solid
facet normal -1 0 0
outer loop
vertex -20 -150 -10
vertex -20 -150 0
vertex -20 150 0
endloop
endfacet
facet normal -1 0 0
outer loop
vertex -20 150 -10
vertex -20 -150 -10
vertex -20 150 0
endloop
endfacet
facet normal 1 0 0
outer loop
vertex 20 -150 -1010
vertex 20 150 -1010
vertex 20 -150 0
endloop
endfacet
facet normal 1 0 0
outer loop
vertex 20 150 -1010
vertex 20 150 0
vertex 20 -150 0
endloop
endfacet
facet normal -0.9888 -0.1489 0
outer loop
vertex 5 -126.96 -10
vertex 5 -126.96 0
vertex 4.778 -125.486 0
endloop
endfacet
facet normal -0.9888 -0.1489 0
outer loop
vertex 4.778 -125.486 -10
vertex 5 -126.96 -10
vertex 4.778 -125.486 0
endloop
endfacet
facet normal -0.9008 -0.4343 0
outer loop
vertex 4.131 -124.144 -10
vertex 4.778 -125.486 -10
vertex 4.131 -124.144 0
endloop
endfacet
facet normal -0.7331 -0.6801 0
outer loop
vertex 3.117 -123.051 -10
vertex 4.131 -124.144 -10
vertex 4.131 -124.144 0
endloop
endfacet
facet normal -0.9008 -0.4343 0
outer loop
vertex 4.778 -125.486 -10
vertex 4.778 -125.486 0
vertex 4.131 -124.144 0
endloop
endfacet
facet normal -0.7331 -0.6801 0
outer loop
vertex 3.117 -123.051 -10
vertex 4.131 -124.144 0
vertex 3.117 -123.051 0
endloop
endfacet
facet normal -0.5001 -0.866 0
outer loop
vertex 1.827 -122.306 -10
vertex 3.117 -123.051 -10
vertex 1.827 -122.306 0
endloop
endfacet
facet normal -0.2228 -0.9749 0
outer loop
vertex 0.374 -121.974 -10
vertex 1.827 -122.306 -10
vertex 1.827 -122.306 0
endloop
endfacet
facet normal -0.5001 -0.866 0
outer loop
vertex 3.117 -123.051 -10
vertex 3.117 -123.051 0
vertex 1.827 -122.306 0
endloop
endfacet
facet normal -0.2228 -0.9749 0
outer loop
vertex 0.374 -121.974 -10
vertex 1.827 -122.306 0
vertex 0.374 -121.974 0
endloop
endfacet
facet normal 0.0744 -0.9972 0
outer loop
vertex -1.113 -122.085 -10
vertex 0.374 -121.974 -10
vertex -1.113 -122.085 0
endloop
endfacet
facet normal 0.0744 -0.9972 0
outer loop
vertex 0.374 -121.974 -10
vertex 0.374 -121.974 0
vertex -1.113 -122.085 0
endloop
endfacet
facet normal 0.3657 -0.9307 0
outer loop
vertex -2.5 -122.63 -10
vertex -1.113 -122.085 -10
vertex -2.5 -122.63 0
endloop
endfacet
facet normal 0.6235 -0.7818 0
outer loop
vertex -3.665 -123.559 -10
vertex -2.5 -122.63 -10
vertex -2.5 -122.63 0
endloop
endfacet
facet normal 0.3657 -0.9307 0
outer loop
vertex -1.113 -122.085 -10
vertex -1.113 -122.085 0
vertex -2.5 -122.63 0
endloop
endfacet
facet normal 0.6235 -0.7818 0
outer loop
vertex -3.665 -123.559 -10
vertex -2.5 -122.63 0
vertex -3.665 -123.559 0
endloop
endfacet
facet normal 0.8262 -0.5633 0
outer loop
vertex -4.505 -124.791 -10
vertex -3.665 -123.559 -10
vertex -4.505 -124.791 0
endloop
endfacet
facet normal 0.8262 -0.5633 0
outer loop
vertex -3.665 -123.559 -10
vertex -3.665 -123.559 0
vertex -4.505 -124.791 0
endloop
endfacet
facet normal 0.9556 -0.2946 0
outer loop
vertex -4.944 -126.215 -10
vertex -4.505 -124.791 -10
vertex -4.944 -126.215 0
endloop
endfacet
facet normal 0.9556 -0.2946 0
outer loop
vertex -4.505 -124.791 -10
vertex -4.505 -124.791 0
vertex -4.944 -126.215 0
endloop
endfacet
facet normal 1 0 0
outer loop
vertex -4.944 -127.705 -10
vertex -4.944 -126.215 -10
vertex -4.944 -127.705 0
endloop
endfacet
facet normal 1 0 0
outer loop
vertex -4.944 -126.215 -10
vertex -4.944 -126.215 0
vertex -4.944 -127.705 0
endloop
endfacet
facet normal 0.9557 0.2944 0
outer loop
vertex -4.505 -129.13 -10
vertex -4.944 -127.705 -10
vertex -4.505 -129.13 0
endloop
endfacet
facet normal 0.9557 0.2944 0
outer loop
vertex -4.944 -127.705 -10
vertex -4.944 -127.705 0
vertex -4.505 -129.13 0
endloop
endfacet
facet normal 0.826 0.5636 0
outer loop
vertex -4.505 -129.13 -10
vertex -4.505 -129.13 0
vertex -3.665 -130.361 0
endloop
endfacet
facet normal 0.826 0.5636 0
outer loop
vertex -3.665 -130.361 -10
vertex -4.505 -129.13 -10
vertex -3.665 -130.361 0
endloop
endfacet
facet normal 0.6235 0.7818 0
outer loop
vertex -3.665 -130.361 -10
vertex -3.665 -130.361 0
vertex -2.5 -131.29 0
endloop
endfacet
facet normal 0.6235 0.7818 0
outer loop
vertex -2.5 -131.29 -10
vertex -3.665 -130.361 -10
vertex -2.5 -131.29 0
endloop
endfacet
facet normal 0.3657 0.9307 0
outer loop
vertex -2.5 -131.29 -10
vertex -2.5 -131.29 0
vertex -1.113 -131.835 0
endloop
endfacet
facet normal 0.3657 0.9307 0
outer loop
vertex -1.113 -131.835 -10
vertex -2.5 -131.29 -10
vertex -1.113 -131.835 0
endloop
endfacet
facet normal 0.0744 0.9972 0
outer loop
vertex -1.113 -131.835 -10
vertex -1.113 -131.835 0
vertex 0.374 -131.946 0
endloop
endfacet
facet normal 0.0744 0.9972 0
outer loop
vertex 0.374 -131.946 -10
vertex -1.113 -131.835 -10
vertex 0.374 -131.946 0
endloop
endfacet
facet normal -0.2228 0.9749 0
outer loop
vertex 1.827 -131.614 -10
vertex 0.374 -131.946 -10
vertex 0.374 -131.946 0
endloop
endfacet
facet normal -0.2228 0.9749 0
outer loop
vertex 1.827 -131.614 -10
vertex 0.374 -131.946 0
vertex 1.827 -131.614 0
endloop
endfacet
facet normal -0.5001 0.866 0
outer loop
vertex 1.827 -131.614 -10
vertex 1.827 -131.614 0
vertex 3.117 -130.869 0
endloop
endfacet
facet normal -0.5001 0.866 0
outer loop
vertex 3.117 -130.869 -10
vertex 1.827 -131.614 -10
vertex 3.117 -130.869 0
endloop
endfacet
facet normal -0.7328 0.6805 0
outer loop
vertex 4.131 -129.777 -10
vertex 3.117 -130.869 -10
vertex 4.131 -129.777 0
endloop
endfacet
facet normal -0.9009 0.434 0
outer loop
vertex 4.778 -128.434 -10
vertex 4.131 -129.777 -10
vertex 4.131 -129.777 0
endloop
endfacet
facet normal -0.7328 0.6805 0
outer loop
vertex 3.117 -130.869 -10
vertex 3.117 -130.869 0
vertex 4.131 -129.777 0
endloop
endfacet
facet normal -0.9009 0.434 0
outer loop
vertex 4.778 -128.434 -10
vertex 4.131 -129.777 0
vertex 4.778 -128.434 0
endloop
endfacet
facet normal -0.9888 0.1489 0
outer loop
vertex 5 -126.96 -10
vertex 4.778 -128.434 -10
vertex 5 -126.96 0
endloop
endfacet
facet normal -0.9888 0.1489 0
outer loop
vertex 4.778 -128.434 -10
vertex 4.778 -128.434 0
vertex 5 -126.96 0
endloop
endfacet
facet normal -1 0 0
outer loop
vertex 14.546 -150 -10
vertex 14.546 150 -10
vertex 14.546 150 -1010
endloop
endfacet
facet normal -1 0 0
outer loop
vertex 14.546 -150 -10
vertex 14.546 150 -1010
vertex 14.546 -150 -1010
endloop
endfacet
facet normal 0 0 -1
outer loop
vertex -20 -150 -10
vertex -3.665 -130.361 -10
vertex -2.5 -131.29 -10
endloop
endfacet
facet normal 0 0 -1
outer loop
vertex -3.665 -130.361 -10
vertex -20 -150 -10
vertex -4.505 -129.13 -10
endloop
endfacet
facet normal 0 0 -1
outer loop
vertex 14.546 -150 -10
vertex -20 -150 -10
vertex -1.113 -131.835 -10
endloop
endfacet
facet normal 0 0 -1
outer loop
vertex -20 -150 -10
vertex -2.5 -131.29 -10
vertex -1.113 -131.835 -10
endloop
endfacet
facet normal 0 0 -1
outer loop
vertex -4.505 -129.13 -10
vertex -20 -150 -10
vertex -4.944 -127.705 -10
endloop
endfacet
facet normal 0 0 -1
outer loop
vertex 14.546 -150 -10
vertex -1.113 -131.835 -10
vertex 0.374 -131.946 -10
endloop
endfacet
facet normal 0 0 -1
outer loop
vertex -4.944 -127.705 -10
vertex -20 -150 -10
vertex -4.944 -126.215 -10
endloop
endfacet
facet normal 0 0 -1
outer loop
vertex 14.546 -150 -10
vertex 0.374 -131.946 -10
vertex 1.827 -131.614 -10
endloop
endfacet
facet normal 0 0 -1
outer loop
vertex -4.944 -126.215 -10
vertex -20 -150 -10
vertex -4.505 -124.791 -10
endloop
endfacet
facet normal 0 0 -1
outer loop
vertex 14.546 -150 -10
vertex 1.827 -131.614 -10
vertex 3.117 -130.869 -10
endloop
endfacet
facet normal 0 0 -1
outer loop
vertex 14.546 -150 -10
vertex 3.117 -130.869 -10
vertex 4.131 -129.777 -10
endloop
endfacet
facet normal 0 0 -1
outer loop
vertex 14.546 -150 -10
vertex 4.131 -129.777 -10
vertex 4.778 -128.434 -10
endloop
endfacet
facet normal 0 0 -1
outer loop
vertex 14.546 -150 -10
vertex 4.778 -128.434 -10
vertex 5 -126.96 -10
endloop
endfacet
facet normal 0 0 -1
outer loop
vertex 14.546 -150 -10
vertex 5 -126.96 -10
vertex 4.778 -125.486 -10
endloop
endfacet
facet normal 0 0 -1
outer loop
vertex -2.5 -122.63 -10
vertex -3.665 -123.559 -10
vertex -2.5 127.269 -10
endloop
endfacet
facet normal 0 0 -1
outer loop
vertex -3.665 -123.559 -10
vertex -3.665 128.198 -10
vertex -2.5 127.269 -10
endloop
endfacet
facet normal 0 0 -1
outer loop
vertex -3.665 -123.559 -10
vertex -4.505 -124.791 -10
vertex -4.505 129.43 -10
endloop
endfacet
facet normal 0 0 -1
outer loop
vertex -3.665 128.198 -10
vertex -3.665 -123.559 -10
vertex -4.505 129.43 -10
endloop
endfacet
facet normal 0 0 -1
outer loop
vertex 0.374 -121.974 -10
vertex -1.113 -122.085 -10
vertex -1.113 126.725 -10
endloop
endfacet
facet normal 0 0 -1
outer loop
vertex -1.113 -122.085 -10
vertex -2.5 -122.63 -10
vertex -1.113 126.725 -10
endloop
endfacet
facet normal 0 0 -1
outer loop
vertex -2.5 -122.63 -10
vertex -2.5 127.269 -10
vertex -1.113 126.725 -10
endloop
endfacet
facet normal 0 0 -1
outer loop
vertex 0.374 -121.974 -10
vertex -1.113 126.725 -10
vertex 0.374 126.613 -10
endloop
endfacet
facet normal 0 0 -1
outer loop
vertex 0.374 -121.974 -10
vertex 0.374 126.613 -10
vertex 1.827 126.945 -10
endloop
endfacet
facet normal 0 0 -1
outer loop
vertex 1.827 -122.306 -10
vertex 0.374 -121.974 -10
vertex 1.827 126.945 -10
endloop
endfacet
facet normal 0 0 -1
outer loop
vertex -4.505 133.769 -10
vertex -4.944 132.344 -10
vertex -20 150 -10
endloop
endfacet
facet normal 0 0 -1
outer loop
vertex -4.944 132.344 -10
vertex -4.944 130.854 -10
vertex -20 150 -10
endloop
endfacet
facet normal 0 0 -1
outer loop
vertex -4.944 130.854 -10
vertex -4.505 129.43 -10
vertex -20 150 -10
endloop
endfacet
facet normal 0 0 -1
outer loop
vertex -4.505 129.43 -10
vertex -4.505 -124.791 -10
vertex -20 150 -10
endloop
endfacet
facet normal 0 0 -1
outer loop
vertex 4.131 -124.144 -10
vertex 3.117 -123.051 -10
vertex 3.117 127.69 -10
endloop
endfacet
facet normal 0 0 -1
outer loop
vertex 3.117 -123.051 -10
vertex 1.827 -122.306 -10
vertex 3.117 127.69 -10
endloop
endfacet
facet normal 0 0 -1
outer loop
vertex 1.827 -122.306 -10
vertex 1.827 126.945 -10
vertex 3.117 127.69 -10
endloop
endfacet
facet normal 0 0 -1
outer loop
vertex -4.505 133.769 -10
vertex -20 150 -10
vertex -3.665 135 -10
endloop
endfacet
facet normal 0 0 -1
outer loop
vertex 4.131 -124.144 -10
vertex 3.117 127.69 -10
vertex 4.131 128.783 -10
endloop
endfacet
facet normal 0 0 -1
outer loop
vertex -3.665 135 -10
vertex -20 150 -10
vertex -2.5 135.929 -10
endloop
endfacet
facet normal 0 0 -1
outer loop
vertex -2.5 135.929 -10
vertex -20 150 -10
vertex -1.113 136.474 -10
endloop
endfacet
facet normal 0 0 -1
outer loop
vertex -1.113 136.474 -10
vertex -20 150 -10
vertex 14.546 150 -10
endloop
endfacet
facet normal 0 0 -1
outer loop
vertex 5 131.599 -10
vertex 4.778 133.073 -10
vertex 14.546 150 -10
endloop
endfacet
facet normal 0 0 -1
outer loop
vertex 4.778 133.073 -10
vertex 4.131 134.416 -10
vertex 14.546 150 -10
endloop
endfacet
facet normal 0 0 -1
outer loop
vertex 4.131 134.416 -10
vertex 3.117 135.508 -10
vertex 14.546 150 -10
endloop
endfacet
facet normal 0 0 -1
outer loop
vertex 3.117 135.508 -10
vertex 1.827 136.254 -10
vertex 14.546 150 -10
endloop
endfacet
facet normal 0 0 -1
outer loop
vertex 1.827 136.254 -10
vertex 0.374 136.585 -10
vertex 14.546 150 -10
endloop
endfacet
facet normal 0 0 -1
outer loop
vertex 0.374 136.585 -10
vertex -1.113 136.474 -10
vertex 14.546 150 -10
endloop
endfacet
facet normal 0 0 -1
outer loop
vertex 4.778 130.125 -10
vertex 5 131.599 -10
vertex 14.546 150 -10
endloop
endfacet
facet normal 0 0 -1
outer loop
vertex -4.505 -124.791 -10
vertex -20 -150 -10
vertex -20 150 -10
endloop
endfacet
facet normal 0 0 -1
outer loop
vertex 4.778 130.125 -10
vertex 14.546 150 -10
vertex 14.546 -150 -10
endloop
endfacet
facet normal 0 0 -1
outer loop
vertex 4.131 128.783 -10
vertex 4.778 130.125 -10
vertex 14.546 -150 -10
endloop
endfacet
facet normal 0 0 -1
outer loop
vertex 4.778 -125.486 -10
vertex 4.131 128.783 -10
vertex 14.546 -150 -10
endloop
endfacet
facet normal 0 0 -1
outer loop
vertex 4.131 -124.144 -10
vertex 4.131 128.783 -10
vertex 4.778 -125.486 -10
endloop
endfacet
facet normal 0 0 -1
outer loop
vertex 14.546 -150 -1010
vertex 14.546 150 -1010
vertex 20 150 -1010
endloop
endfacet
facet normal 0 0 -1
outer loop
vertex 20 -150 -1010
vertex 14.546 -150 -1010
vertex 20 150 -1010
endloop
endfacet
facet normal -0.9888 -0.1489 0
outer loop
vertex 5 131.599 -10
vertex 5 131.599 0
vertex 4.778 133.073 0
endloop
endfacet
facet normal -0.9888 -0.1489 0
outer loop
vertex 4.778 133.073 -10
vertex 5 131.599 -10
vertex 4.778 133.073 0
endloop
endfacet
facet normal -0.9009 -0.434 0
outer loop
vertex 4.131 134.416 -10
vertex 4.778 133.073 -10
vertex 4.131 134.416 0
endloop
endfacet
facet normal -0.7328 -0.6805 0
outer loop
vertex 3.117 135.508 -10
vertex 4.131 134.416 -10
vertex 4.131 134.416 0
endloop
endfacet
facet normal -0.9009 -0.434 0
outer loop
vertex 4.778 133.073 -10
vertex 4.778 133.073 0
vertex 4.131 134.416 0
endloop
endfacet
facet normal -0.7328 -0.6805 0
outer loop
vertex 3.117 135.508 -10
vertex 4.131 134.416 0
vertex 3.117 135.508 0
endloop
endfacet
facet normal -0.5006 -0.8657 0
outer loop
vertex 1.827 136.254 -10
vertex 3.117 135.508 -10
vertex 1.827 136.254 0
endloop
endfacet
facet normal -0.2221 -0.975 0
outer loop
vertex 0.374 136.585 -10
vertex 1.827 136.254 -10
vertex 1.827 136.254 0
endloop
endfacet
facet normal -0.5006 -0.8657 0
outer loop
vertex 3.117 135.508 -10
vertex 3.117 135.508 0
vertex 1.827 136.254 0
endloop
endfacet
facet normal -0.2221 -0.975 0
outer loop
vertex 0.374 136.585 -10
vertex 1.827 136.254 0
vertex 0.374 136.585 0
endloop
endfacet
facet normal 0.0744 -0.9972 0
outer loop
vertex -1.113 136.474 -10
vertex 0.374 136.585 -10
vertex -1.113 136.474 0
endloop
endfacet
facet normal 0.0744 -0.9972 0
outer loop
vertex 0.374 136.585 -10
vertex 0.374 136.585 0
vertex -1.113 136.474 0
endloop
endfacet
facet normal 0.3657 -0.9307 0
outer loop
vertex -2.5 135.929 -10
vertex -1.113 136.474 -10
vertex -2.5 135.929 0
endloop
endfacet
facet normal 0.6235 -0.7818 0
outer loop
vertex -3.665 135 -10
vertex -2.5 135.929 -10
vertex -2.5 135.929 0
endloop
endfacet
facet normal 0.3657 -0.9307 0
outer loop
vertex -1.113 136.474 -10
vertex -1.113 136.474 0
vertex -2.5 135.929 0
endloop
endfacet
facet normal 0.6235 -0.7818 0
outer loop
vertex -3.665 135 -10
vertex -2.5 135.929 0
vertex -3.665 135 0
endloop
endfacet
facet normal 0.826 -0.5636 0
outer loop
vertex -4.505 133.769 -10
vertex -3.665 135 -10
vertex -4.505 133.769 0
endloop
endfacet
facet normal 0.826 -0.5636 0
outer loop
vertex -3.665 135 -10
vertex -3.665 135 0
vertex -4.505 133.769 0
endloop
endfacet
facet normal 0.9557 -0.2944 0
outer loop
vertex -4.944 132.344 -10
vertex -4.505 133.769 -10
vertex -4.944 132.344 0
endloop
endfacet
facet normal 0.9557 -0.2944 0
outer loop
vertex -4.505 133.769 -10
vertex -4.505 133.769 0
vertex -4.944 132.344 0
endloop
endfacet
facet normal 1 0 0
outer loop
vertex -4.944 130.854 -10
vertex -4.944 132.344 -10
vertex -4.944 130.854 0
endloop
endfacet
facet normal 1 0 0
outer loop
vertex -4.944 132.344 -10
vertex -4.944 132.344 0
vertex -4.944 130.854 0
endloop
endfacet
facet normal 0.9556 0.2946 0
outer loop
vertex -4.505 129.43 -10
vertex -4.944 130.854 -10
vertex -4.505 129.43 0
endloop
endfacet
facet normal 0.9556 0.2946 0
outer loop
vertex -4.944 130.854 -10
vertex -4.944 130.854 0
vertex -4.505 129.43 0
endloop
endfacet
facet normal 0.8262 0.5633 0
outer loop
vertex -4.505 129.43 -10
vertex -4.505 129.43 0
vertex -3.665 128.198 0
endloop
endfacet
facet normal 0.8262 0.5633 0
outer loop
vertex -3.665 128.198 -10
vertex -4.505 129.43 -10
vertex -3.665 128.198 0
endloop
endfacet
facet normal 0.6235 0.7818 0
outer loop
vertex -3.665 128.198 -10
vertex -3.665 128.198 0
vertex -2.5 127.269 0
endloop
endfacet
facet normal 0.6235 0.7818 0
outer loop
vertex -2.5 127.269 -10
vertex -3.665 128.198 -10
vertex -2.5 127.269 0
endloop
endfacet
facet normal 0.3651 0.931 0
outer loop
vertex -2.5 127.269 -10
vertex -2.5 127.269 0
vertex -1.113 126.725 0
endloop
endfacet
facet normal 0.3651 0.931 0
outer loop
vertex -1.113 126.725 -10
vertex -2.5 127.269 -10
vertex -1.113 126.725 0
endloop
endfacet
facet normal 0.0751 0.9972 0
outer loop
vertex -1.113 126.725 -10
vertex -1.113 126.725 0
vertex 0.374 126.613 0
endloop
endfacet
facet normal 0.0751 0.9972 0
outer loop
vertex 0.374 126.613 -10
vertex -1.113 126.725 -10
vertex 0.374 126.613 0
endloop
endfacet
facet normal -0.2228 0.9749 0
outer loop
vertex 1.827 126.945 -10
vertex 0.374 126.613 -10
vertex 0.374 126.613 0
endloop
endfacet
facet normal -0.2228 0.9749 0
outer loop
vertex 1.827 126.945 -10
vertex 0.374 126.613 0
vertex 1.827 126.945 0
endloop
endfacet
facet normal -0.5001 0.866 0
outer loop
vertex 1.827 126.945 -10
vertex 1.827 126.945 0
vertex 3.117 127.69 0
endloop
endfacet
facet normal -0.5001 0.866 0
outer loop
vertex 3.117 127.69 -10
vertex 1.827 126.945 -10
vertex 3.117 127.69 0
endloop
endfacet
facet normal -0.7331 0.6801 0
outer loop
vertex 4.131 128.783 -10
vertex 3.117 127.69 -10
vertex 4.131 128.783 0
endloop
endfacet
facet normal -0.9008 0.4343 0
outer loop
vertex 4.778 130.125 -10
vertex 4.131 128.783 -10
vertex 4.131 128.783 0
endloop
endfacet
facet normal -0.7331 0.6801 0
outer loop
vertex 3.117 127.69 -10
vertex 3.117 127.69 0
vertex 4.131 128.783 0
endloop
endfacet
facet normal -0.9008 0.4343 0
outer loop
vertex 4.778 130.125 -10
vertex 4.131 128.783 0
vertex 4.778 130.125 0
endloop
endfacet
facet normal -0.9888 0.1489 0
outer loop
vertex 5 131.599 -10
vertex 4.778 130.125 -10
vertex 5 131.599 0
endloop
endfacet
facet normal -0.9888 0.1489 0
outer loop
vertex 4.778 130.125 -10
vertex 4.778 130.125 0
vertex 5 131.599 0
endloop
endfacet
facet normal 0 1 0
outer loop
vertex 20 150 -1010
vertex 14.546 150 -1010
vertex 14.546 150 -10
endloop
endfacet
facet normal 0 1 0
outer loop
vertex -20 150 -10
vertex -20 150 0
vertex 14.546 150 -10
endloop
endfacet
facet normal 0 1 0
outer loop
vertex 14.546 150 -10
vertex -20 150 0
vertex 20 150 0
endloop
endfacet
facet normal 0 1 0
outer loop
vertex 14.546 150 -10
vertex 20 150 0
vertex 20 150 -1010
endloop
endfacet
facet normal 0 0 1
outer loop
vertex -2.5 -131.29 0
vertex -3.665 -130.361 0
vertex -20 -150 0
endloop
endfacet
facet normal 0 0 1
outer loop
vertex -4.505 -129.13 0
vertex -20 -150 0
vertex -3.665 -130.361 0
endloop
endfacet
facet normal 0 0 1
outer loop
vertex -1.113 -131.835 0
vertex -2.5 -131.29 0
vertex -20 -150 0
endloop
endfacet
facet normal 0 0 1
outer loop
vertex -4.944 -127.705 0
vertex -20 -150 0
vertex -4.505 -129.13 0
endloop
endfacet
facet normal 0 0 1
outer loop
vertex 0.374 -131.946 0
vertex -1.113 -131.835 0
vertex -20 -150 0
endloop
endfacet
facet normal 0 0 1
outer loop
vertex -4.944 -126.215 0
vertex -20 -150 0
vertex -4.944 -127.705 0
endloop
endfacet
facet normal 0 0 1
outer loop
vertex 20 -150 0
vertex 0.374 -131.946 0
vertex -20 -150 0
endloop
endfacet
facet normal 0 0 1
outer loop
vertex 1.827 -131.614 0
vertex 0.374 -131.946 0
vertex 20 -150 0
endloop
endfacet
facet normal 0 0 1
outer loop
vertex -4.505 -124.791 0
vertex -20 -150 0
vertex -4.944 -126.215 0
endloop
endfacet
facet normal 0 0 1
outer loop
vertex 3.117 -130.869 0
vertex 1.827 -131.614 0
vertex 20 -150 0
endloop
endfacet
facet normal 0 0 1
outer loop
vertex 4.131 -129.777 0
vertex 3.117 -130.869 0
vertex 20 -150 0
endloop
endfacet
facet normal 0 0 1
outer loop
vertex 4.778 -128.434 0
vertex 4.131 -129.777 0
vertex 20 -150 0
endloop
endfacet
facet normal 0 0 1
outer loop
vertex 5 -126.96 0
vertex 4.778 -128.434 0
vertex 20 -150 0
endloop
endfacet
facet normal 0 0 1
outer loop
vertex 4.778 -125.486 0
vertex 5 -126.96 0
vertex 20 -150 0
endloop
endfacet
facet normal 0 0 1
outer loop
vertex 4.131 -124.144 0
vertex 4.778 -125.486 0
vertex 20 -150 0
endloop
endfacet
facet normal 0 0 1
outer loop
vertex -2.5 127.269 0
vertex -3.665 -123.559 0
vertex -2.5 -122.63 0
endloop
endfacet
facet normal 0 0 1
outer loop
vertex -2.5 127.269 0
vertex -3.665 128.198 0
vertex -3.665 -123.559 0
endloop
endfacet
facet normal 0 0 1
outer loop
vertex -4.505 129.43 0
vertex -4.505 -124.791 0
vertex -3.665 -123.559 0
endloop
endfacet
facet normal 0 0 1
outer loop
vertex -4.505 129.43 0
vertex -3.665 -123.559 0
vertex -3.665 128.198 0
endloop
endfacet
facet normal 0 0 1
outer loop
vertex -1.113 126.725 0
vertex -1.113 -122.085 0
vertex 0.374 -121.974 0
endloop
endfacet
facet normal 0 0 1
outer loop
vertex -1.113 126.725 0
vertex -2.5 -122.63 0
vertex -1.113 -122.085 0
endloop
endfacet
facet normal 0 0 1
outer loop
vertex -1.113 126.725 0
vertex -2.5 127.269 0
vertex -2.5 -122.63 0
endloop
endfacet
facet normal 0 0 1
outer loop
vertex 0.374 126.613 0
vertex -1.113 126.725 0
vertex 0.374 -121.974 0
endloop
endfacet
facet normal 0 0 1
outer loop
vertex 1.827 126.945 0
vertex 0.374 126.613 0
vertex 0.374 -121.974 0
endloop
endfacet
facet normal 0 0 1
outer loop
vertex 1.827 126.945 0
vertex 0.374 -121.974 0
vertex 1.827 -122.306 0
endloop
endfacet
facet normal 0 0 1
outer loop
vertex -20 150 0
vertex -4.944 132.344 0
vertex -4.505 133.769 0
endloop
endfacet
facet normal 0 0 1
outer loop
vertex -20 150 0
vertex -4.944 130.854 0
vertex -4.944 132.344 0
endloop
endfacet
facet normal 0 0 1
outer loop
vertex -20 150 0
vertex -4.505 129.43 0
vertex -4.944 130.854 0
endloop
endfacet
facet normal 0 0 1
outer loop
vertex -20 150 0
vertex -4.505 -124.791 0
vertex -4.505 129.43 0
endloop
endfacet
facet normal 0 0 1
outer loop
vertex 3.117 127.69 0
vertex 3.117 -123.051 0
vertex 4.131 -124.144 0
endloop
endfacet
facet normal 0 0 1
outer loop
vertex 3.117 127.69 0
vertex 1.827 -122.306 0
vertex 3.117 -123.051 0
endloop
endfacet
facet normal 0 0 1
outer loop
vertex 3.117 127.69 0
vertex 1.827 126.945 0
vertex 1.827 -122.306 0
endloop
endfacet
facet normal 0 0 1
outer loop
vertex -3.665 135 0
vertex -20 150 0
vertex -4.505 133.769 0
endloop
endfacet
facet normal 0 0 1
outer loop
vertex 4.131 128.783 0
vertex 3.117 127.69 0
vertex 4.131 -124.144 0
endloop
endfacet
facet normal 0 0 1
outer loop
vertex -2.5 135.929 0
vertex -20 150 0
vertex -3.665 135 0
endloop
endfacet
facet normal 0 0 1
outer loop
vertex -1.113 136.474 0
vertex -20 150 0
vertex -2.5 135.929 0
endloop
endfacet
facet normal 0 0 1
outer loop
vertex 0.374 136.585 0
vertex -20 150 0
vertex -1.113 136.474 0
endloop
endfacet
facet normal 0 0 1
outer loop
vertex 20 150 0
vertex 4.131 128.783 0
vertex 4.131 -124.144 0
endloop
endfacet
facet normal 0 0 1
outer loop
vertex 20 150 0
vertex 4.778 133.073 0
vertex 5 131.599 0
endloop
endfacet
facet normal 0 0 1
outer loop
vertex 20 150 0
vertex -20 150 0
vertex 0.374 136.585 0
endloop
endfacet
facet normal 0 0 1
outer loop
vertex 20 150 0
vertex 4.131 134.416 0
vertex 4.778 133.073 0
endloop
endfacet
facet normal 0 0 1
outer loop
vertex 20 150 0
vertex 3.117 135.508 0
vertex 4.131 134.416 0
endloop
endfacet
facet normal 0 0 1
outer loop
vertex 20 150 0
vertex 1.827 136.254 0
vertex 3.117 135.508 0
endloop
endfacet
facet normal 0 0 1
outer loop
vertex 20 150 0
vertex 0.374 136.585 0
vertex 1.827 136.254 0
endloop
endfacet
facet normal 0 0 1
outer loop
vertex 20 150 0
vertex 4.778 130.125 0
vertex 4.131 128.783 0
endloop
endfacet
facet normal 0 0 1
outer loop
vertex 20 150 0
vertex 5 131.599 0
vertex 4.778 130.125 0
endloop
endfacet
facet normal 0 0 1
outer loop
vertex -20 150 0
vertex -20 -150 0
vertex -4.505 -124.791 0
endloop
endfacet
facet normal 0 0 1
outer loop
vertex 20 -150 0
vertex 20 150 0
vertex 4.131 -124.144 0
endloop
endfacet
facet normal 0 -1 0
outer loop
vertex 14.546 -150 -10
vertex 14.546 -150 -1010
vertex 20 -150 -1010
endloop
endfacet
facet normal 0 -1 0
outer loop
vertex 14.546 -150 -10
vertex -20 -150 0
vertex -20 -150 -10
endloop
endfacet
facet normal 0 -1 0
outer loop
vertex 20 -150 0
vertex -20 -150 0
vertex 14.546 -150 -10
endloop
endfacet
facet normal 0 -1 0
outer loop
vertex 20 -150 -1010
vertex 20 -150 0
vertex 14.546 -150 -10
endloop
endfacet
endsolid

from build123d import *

# Parameters (mm, degrees)
F0_W     = 40
F0_H     = 300
F0_R     = 5
F1_DEPTH = 10
F2_W     = 5.453752
F2_H     = 300
F3_DEPTH = 1000


with BuildPart() as f1:
    # F0 (on Top) → F1 (new body)
    with BuildSketch(Plane.XY):
        Rectangle(F0_W, F0_H)
        with Locations((0, -126.960114)):
            Circle(F0_R, mode=Mode.SUBTRACT)
        with Locations((0, 131.599203)):
            Circle(F0_R, mode=Mode.SUBTRACT)
    extrude(amount=-F1_DEPTH)

    # F2 (on face) → F3 (join)
    with BuildSketch(Plane(origin=(0, 0, -10), x_dir=(1, 0, 0), z_dir=(0, 0, -1))):
        with Locations((17.273124, 0)):
            Rectangle(F2_W, F2_H)
    extrude(amount=F3_DEPTH)


solid = f1.part
